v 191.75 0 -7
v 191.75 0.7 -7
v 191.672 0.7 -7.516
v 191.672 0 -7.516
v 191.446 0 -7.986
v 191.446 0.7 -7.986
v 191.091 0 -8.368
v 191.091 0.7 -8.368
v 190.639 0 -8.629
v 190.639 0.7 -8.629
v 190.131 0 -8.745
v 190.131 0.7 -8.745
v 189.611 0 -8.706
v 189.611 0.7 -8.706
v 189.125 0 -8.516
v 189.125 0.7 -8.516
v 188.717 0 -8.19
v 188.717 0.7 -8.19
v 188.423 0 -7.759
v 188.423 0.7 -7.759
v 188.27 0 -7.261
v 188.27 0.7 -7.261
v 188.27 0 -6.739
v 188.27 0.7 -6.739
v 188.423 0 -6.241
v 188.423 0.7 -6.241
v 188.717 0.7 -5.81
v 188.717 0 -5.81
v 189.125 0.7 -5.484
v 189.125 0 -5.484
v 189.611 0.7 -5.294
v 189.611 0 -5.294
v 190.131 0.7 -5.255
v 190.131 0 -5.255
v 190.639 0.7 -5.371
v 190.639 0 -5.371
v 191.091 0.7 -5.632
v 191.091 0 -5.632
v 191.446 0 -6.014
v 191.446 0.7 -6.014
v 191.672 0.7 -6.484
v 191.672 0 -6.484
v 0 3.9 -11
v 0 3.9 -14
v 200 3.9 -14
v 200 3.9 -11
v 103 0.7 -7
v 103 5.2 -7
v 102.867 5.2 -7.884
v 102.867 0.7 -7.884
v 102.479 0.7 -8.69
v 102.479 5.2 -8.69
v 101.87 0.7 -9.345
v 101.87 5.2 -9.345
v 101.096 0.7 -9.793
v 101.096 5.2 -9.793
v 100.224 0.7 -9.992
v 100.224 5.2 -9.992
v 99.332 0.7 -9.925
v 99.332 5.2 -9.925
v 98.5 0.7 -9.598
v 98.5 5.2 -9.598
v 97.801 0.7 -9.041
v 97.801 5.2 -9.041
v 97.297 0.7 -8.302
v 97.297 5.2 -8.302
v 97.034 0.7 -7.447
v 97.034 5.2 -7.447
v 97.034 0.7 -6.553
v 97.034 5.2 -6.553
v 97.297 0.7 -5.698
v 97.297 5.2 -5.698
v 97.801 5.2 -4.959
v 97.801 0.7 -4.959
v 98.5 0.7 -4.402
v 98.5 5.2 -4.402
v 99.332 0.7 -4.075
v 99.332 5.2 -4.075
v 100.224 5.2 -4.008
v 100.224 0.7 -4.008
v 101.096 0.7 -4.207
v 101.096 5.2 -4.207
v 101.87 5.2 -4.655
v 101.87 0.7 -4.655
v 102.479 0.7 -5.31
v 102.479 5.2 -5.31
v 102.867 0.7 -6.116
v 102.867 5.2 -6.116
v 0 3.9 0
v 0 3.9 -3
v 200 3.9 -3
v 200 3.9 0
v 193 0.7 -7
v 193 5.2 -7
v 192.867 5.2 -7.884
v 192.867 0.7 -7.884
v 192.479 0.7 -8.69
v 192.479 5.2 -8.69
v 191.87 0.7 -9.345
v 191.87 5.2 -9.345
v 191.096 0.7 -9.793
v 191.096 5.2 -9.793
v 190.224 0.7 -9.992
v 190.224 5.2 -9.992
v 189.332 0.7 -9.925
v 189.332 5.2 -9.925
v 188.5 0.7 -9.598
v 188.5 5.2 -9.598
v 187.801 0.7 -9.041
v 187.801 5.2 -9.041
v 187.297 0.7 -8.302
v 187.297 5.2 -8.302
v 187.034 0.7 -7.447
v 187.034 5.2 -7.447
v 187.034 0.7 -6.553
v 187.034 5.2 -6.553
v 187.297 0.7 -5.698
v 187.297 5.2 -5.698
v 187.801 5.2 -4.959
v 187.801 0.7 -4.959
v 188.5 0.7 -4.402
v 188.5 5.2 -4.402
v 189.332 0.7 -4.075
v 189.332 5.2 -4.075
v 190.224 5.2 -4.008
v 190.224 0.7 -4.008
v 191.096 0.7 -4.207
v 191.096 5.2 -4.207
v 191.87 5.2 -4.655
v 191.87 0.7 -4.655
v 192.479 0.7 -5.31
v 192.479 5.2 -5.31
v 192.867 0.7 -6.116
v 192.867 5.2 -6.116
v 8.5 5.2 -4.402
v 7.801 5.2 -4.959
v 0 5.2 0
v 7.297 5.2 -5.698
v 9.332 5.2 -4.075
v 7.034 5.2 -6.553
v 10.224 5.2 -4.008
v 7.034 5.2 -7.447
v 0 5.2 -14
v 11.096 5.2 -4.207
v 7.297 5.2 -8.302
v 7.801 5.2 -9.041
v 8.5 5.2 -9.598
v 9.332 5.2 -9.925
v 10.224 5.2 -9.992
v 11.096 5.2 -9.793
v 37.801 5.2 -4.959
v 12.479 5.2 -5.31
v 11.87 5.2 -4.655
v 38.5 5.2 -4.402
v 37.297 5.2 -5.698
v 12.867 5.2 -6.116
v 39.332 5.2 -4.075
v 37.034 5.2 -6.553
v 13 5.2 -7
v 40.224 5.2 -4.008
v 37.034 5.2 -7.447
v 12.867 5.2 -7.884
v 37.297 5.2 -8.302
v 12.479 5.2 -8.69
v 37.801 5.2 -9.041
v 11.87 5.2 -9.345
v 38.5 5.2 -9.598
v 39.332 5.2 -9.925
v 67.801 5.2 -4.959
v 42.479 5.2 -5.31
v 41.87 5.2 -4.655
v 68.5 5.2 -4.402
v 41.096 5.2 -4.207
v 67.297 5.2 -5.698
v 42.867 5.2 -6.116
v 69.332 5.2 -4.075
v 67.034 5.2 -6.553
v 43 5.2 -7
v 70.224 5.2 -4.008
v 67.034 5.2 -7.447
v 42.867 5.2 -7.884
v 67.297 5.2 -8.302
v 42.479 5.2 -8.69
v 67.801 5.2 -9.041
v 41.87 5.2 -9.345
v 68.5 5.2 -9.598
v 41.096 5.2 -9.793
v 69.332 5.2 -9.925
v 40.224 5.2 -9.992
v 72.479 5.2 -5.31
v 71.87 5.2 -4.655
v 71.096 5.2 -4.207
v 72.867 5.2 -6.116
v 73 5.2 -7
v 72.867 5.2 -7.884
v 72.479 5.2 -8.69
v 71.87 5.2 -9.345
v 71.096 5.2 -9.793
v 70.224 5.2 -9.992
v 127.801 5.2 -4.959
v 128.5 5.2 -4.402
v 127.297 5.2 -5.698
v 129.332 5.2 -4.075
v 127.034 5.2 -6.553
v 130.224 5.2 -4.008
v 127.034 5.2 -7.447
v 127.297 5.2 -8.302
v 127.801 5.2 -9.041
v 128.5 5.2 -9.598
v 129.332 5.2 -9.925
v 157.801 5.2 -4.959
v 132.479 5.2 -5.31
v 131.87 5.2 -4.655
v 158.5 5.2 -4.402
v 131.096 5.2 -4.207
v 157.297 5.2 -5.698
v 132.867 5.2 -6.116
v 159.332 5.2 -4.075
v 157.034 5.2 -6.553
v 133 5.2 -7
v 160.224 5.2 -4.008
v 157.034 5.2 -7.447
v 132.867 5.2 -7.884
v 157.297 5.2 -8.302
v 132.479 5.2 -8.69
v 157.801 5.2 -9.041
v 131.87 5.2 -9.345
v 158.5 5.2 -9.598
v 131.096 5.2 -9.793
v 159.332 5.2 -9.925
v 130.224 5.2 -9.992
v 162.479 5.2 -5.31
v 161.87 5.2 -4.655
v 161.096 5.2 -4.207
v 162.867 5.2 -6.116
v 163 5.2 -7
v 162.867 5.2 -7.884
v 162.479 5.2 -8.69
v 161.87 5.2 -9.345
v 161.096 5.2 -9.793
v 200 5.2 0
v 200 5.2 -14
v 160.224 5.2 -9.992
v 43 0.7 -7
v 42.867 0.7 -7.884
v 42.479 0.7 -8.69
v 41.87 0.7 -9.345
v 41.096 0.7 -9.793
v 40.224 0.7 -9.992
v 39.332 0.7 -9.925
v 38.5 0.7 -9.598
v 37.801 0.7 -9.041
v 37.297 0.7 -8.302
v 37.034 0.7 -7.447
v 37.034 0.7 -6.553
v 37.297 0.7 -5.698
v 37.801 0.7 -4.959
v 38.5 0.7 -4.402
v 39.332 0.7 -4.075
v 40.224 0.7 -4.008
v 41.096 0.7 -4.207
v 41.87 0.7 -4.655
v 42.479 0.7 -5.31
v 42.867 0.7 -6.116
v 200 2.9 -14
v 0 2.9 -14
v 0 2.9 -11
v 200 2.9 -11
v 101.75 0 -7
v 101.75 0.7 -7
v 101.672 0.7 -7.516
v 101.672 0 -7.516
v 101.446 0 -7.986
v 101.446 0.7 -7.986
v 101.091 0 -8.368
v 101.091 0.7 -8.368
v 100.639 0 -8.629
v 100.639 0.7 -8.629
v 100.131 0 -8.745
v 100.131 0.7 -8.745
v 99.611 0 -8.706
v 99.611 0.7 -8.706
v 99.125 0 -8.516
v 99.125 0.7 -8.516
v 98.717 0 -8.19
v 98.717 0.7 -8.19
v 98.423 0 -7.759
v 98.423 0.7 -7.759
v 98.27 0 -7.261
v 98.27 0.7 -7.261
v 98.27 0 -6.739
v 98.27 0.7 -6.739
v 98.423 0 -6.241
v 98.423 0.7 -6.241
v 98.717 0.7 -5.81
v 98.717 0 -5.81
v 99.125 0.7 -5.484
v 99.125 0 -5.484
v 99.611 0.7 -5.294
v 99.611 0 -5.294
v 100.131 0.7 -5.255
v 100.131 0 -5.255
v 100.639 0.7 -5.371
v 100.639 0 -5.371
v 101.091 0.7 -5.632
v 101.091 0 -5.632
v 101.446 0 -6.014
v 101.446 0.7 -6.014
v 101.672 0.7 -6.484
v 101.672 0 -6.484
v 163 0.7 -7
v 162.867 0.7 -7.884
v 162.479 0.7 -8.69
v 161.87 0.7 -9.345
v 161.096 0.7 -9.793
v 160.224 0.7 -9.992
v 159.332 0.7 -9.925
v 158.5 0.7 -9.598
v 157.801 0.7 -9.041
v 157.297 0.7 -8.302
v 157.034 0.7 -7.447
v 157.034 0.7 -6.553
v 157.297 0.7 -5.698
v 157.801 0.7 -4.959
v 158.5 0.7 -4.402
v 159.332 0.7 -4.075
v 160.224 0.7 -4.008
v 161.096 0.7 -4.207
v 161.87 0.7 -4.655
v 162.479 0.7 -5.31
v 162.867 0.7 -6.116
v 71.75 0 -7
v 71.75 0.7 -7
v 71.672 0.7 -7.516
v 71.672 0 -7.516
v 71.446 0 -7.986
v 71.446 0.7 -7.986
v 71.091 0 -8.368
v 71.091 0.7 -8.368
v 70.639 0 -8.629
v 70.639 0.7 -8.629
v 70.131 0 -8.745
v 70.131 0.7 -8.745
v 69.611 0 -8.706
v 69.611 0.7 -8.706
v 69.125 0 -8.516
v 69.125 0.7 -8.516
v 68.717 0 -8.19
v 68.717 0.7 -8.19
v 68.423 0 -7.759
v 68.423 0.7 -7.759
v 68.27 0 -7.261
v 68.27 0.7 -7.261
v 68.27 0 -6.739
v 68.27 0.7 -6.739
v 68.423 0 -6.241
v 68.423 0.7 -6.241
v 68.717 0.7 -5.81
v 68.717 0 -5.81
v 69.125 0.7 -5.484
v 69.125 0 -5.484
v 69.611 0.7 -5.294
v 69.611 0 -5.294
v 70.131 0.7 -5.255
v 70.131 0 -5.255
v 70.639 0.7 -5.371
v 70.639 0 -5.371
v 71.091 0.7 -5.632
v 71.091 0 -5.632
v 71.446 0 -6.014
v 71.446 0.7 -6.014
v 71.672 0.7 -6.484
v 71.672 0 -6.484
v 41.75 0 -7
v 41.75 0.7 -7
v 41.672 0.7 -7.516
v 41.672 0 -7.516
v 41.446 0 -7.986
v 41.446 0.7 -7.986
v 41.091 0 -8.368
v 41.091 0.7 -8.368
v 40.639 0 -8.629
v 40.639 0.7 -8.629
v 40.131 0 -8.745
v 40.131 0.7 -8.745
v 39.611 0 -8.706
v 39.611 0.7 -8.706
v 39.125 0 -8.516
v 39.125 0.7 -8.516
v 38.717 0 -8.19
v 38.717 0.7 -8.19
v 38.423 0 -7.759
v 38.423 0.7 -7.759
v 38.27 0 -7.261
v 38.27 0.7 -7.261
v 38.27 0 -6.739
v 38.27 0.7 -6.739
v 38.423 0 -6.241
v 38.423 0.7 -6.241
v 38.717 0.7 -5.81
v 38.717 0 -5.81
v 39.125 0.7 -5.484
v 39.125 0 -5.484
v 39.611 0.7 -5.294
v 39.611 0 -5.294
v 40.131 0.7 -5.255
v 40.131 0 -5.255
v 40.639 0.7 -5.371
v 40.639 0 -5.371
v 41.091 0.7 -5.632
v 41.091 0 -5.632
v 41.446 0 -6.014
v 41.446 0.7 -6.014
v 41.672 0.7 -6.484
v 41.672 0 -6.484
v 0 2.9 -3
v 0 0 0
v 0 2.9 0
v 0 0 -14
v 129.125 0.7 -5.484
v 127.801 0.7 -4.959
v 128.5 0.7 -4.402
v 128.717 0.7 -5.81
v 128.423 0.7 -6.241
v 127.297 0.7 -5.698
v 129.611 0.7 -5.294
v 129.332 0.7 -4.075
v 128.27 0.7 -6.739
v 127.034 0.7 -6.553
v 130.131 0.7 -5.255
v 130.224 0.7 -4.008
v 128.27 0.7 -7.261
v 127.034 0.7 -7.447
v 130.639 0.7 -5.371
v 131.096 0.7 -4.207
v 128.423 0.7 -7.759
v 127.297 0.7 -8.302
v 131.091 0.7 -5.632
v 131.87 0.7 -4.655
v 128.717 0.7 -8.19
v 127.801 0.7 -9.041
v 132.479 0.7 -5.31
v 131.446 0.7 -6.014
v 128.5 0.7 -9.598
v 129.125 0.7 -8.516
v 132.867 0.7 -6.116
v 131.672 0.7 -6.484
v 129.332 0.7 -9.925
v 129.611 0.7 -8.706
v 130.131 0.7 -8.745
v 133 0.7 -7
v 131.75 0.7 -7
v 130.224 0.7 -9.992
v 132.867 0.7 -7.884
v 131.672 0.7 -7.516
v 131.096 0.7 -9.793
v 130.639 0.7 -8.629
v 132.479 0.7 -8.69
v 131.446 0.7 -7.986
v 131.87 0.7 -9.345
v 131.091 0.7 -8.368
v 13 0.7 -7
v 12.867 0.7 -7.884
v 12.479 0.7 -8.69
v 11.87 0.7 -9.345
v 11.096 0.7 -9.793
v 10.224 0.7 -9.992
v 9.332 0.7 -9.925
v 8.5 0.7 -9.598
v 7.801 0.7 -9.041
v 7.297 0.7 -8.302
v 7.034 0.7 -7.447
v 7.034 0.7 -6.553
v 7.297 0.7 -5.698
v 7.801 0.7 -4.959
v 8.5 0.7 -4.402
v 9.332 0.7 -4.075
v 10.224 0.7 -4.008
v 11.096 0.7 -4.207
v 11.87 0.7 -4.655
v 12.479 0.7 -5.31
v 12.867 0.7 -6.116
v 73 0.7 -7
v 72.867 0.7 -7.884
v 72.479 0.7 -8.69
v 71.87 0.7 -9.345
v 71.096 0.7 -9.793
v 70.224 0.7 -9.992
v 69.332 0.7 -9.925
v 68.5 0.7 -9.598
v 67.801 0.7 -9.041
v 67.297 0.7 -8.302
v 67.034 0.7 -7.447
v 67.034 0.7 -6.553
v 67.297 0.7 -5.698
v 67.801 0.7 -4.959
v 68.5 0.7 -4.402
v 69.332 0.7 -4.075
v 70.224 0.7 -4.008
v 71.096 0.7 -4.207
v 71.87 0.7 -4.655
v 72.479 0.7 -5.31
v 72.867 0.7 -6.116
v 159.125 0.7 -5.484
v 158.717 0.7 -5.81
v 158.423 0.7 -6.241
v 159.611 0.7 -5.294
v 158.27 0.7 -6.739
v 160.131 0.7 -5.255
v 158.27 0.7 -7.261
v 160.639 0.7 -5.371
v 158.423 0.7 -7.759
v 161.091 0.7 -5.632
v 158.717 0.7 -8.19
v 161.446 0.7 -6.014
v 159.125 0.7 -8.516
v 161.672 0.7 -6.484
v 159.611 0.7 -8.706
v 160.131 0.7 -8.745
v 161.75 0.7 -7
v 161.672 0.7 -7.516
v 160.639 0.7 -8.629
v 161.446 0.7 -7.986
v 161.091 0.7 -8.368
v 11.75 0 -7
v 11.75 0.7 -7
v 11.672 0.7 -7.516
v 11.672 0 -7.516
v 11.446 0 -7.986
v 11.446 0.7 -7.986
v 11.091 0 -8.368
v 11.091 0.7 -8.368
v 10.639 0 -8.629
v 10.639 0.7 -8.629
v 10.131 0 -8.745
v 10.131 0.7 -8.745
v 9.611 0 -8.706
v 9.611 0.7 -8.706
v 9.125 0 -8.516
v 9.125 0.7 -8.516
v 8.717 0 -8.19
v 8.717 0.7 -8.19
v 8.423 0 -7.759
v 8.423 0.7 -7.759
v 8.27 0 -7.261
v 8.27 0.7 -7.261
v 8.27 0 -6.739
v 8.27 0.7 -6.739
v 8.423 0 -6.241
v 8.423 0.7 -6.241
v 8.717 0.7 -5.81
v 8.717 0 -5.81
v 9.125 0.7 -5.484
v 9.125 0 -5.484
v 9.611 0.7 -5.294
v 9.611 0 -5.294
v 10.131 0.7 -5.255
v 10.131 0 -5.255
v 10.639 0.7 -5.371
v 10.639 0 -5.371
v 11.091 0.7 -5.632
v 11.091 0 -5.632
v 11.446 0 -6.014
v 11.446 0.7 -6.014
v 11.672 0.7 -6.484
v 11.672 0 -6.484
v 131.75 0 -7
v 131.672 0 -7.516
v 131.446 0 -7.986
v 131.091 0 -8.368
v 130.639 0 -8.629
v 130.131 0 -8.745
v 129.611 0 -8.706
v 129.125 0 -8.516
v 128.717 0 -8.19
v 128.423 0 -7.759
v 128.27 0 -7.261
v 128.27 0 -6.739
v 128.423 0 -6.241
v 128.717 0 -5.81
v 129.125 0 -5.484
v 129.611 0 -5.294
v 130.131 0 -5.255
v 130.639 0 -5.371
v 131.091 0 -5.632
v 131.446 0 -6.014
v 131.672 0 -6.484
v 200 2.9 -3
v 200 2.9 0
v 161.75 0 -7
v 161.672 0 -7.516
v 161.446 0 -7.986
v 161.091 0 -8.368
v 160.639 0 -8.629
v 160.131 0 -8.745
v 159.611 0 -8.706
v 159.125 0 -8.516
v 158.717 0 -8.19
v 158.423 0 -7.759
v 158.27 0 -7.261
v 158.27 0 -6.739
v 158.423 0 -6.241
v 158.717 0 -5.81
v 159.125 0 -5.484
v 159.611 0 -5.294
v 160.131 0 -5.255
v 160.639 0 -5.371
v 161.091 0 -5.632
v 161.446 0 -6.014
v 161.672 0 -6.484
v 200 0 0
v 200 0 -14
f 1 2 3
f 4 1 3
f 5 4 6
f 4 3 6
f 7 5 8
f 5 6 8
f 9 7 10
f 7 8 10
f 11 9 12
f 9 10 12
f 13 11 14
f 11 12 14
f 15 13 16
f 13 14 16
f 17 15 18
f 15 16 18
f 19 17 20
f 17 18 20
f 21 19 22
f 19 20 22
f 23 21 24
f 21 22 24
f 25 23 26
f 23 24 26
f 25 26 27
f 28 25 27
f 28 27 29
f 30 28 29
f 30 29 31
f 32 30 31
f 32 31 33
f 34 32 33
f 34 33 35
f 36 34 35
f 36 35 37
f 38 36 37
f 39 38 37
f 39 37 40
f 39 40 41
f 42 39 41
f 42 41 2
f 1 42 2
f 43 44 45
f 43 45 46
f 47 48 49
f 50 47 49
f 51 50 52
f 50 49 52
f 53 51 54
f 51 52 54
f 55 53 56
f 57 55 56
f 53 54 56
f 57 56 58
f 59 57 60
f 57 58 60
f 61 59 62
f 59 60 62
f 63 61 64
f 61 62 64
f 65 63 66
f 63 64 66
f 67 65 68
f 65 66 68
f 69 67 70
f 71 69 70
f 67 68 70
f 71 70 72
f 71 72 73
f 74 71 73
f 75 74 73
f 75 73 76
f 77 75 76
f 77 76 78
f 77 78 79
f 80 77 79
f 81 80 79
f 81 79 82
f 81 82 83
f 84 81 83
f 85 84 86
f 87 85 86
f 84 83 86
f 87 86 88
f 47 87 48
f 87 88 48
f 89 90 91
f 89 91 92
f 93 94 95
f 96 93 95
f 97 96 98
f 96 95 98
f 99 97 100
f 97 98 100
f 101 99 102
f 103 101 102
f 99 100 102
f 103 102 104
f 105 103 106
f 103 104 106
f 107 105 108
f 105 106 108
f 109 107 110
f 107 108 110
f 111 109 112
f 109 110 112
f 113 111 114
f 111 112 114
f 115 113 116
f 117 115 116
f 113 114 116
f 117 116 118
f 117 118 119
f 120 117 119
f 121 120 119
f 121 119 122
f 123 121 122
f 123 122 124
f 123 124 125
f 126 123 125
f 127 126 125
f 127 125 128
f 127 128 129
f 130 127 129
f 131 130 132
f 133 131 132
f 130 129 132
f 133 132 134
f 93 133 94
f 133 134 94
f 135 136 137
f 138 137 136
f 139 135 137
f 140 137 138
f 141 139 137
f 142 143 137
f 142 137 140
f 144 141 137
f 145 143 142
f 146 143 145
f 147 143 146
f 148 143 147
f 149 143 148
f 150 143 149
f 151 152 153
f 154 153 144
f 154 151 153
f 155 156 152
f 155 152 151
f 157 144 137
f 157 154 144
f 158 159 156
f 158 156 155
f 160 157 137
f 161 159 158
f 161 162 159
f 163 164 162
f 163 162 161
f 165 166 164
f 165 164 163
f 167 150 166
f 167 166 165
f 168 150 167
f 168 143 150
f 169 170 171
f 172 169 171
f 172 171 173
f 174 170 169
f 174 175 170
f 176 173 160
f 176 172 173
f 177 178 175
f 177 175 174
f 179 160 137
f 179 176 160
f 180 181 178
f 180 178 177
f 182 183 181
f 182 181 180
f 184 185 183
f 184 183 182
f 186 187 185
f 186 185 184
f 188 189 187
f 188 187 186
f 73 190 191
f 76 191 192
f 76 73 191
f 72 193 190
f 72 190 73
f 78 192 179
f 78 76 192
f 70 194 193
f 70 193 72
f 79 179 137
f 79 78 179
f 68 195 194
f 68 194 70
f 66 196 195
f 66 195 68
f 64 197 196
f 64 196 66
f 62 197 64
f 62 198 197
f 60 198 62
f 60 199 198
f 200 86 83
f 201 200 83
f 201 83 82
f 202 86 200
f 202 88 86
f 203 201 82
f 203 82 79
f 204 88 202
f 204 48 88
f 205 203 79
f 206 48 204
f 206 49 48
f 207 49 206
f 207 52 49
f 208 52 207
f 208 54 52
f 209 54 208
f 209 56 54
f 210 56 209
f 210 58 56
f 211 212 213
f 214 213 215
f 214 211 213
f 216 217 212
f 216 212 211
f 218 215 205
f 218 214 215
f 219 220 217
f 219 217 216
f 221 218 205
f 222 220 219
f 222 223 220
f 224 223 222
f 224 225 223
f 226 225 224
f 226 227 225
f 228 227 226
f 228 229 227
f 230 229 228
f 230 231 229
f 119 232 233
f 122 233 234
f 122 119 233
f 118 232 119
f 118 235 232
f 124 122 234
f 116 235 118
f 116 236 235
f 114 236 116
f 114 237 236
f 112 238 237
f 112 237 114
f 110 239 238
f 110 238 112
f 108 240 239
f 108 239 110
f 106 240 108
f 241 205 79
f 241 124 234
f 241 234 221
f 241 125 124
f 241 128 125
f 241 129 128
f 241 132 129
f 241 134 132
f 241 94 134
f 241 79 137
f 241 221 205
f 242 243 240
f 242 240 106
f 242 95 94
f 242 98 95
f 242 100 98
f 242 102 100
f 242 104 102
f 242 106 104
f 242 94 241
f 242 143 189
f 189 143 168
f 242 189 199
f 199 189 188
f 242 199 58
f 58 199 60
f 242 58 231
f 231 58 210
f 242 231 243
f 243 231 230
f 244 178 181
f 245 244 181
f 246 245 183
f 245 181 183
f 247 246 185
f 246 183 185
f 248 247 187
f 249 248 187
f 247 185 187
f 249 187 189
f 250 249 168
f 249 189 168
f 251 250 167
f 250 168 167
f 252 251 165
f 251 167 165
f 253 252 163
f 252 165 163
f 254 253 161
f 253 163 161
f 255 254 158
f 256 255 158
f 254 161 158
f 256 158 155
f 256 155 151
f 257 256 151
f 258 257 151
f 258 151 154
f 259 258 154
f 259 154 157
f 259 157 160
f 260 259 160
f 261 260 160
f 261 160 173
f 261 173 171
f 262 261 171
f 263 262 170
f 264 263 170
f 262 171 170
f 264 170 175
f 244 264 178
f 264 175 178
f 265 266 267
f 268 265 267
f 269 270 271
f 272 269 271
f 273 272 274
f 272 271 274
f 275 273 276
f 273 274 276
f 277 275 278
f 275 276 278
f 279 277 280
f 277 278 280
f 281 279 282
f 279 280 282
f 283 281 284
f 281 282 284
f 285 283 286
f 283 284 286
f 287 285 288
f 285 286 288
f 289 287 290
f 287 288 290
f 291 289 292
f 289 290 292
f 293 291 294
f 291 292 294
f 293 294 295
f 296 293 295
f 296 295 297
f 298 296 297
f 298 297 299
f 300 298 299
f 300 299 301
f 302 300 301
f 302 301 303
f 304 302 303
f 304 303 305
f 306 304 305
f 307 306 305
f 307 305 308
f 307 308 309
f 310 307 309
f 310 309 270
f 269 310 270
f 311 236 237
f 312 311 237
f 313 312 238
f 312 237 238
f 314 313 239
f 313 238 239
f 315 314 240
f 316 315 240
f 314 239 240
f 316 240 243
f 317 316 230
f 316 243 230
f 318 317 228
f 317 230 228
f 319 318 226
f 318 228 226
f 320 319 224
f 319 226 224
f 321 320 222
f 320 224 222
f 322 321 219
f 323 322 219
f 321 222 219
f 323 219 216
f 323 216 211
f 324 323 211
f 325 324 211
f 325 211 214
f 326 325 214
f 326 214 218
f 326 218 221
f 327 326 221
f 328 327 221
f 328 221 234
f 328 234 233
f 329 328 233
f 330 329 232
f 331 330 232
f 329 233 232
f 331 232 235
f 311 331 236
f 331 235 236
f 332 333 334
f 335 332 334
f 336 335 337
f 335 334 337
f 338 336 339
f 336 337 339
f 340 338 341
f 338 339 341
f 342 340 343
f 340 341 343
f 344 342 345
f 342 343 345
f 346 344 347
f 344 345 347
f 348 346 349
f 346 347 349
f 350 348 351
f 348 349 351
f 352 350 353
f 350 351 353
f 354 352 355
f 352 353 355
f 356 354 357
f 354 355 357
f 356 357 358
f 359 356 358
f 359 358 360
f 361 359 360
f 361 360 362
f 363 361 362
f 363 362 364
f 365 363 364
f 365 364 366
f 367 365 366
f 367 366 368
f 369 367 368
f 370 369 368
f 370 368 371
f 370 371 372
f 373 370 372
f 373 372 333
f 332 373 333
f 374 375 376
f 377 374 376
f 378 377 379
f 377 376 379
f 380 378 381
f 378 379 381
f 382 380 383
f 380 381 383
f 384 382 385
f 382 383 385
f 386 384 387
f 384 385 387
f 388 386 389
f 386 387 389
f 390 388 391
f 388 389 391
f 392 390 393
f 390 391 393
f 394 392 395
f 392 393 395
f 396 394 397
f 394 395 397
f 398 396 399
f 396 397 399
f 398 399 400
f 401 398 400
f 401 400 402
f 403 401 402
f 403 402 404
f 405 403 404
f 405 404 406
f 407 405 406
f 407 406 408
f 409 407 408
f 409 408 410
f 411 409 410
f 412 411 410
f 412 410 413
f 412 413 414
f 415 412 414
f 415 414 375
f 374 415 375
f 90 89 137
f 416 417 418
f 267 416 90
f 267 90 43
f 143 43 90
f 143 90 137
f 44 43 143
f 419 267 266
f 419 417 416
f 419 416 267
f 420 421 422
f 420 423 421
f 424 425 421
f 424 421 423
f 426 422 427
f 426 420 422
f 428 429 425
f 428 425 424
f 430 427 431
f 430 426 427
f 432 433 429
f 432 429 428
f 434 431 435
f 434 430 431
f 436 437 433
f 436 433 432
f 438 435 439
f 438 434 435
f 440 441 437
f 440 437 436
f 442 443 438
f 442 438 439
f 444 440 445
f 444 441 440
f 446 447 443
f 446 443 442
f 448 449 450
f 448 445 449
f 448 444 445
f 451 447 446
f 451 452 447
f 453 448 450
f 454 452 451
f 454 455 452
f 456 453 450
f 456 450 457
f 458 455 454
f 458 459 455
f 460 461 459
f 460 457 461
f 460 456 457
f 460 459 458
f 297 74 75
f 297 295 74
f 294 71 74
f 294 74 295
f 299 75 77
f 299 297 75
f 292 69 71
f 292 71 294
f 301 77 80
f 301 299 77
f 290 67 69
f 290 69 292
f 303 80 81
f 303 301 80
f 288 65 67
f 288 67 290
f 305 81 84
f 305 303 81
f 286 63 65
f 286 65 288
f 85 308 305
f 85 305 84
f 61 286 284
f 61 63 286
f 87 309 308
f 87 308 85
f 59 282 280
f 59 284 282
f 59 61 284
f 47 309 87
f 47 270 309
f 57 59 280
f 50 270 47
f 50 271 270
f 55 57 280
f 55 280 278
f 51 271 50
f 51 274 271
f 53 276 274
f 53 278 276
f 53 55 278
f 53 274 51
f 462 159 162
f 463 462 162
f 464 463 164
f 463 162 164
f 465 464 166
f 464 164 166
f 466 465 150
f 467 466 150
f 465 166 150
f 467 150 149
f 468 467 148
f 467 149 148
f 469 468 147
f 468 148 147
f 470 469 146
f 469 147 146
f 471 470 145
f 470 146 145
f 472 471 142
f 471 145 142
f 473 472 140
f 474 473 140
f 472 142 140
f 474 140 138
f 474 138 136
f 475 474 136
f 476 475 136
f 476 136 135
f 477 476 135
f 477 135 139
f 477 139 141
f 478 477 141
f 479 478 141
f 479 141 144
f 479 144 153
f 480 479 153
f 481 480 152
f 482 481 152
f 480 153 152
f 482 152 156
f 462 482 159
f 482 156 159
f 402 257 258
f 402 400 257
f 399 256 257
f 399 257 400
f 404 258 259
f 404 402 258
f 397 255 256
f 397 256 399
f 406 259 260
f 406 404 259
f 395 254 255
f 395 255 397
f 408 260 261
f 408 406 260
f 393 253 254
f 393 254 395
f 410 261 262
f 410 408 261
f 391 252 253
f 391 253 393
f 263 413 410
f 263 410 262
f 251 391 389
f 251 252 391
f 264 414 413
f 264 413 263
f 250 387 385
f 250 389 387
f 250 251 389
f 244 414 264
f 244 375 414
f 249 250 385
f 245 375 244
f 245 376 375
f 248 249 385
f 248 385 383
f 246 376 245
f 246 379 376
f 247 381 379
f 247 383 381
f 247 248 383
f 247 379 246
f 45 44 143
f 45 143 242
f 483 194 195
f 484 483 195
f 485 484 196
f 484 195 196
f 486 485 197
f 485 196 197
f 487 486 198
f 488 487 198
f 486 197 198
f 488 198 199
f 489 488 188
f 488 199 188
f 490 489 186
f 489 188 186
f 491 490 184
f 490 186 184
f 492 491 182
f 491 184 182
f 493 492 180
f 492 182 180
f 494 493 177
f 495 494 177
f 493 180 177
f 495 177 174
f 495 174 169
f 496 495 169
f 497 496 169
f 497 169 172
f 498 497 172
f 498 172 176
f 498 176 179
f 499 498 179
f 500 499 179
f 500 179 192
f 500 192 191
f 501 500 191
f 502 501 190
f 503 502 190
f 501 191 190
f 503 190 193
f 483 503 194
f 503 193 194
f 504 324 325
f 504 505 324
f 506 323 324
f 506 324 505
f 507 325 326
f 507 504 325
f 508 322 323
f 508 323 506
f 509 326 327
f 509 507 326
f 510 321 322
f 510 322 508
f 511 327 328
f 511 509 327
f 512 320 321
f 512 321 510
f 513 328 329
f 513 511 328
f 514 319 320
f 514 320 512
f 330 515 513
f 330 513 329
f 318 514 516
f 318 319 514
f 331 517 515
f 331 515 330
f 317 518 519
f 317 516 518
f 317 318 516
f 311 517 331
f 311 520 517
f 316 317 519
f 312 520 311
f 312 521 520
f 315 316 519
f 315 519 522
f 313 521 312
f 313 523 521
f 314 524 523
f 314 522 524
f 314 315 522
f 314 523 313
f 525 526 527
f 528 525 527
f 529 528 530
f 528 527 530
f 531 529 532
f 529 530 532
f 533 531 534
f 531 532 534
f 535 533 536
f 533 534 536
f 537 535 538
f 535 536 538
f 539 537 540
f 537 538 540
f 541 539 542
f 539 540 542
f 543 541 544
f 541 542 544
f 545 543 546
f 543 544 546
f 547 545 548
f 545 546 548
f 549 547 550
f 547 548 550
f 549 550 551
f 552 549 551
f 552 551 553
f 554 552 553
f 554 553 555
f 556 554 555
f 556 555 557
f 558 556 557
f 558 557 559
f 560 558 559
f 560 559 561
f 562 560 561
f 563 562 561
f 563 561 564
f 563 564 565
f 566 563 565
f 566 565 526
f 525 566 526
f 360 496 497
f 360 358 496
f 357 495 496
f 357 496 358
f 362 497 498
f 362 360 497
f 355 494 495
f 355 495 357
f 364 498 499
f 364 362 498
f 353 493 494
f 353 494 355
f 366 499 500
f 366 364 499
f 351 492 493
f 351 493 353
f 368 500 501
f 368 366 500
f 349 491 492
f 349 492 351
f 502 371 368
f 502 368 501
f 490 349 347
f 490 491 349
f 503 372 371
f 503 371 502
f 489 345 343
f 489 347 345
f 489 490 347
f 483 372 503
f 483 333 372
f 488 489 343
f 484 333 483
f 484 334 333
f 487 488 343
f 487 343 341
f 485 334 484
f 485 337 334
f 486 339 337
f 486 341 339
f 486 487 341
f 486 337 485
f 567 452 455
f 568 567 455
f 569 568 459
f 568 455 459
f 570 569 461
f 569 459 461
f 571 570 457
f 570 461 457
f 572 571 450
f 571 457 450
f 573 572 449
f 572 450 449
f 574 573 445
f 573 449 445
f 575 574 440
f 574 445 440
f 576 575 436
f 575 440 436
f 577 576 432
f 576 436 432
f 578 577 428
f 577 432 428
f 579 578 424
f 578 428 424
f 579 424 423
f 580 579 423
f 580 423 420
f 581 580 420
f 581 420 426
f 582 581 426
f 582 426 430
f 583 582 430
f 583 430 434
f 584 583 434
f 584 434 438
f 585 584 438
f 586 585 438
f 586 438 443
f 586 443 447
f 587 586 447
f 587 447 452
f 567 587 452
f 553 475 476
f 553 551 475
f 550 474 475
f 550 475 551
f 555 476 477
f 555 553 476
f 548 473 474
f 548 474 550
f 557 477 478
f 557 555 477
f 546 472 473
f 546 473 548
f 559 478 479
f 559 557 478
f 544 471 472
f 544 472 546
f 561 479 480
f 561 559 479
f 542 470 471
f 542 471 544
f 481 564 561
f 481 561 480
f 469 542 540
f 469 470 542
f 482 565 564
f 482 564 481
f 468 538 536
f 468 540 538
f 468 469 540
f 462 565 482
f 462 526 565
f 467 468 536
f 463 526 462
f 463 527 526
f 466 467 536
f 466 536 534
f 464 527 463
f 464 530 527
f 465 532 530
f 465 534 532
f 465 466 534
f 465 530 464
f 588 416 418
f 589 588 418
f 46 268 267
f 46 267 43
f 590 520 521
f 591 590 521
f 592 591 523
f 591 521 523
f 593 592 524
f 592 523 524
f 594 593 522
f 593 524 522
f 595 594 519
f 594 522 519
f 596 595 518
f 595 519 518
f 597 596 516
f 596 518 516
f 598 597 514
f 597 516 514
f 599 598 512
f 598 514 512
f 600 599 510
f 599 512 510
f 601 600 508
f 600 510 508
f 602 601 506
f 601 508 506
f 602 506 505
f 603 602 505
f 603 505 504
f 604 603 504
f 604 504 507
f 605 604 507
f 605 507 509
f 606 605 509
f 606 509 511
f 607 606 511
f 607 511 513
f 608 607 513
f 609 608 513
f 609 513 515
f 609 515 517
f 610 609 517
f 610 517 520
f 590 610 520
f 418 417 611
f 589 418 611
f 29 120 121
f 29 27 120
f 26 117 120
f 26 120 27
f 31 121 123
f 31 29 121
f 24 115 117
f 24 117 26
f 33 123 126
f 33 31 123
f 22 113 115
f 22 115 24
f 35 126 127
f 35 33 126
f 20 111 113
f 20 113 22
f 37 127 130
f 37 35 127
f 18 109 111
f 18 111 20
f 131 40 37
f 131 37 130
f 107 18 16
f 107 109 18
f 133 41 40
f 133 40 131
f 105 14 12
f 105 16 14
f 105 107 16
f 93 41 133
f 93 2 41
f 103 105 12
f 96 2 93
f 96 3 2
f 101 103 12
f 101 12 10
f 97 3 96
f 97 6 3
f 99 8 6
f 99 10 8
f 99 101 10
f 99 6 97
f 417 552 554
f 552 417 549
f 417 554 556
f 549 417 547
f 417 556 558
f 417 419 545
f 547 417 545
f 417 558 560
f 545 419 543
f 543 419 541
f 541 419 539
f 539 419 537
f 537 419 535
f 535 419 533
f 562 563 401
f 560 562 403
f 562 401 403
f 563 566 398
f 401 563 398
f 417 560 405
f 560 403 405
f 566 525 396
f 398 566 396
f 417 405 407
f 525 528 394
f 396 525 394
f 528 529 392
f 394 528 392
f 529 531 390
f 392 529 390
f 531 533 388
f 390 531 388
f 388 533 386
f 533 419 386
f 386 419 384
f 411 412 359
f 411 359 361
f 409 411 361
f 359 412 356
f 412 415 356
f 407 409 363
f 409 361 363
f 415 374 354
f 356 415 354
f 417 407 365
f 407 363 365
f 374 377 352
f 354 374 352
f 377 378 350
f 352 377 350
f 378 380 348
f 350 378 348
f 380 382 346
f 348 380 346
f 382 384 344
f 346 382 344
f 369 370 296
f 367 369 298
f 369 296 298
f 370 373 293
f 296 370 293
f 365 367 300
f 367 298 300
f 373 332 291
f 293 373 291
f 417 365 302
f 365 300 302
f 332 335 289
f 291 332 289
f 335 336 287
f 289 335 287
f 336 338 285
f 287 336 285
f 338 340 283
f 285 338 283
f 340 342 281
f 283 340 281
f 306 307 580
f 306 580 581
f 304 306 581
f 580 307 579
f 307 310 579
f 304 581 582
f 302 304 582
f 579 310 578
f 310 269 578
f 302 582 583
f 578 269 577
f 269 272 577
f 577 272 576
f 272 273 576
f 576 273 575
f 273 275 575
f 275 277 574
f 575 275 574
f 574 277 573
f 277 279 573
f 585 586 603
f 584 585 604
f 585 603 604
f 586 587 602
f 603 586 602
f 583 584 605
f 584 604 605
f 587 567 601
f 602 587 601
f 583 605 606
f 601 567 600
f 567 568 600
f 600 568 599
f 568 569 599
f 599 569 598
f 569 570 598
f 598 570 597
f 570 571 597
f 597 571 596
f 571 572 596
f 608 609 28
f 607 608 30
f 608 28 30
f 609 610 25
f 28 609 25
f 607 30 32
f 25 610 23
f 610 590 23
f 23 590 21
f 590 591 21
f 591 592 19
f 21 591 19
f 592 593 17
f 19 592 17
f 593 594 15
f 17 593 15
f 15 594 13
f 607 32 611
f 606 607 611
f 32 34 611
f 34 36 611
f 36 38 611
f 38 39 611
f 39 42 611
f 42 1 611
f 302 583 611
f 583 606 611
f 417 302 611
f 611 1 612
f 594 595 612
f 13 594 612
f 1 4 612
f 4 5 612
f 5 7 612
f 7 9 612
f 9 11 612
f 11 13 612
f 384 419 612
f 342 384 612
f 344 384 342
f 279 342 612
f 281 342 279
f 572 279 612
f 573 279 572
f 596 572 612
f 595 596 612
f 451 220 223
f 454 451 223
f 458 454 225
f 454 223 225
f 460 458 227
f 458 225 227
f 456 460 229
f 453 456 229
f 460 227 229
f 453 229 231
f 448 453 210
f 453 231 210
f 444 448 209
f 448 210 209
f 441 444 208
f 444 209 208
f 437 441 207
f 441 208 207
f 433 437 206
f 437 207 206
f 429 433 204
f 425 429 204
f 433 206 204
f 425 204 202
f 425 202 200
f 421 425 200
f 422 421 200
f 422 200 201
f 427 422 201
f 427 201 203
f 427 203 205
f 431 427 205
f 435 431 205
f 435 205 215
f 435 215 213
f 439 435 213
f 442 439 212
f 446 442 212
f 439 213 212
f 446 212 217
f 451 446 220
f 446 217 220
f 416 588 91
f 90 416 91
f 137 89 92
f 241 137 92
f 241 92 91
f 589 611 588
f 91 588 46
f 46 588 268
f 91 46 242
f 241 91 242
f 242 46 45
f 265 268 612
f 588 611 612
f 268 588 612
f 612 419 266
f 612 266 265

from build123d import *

# Parameters (mm, degrees)
SKETCH_1_W             = 200
SKETCH_1_H             = 14
EXTRUDE_1_DEPTH        = 5.2
SKETCH_2_W             = 3
SKETCH_2_H             = 1
CUT_EXTRUDE_1_DEPTH    = 210
SKETCH_3_R             = 1.75
CUT_EXTRUDE_2_DEPTH    = 31
SKETCH_3_3_R           = 3
SKETCH_3_3_R_2         = 1.75
CUT_EXTRUDE_3_DEPTH    = 4.5
PATTERN_LINEAR_1_COUNT = 7
PATTERN_LINEAR_1_PITCH = 30


with BuildPart() as part:
    # 草图1 → 凸台-拉伸1 (new body)
    with BuildSketch(Plane(origin=(0, 0, 0), x_dir=(1, 0, 0), z_dir=(0, 1, 0))):
        with Locations((100, 7)):
            Rectangle(SKETCH_1_W, SKETCH_1_H)
    extrude(amount=EXTRUDE_1_DEPTH)

    # 草图2 → 切除-拉伸1 (cut)
    with BuildSketch(Plane.ZY):
        with Locations((-12.5, 3.4)):
            Rectangle(SKETCH_2_W, SKETCH_2_H)
        with Locations((-1.5, 3.4)):
            Rectangle(SKETCH_2_W, SKETCH_2_H)
    extrude(amount=-CUT_EXTRUDE_1_DEPTH, mode=Mode.SUBTRACT)

    # 草图3 → 切除-拉伸2 (cut)
    with BuildSketch(Plane(origin=(0, 5.2, 0), x_dir=(1, 0, 0), z_dir=(0, 1, 0))):
        with Locations((10, 7)):
            Circle(SKETCH_3_R)
    cut_extrude_2 = extrude(amount=-CUT_EXTRUDE_2_DEPTH, mode=Mode.SUBTRACT)

    # 草图3<3> → 切除-拉伸3 (cut)
    with BuildSketch(Plane(origin=(0, 5.2, 0), x_dir=(1, 0, 0), z_dir=(0, 1, 0))):
        with Locations((10, 7)):
            Circle(SKETCH_3_3_R)
        with Locations((10, 7)):
            Circle(SKETCH_3_3_R_2, mode=Mode.SUBTRACT)
    cut_extrude_3 = extrude(amount=-CUT_EXTRUDE_3_DEPTH, mode=Mode.SUBTRACT)

    # 阵列(线性)1: 切除-拉伸2, 切除-拉伸3 ×7
    with Locations(*[(i * PATTERN_LINEAR_1_PITCH, 0, 0) for i in range(1, PATTERN_LINEAR_1_COUNT)]):
        add(cut_extrude_2, mode=Mode.SUBTRACT)
        add(cut_extrude_3, mode=Mode.SUBTRACT)


solid = part.part
